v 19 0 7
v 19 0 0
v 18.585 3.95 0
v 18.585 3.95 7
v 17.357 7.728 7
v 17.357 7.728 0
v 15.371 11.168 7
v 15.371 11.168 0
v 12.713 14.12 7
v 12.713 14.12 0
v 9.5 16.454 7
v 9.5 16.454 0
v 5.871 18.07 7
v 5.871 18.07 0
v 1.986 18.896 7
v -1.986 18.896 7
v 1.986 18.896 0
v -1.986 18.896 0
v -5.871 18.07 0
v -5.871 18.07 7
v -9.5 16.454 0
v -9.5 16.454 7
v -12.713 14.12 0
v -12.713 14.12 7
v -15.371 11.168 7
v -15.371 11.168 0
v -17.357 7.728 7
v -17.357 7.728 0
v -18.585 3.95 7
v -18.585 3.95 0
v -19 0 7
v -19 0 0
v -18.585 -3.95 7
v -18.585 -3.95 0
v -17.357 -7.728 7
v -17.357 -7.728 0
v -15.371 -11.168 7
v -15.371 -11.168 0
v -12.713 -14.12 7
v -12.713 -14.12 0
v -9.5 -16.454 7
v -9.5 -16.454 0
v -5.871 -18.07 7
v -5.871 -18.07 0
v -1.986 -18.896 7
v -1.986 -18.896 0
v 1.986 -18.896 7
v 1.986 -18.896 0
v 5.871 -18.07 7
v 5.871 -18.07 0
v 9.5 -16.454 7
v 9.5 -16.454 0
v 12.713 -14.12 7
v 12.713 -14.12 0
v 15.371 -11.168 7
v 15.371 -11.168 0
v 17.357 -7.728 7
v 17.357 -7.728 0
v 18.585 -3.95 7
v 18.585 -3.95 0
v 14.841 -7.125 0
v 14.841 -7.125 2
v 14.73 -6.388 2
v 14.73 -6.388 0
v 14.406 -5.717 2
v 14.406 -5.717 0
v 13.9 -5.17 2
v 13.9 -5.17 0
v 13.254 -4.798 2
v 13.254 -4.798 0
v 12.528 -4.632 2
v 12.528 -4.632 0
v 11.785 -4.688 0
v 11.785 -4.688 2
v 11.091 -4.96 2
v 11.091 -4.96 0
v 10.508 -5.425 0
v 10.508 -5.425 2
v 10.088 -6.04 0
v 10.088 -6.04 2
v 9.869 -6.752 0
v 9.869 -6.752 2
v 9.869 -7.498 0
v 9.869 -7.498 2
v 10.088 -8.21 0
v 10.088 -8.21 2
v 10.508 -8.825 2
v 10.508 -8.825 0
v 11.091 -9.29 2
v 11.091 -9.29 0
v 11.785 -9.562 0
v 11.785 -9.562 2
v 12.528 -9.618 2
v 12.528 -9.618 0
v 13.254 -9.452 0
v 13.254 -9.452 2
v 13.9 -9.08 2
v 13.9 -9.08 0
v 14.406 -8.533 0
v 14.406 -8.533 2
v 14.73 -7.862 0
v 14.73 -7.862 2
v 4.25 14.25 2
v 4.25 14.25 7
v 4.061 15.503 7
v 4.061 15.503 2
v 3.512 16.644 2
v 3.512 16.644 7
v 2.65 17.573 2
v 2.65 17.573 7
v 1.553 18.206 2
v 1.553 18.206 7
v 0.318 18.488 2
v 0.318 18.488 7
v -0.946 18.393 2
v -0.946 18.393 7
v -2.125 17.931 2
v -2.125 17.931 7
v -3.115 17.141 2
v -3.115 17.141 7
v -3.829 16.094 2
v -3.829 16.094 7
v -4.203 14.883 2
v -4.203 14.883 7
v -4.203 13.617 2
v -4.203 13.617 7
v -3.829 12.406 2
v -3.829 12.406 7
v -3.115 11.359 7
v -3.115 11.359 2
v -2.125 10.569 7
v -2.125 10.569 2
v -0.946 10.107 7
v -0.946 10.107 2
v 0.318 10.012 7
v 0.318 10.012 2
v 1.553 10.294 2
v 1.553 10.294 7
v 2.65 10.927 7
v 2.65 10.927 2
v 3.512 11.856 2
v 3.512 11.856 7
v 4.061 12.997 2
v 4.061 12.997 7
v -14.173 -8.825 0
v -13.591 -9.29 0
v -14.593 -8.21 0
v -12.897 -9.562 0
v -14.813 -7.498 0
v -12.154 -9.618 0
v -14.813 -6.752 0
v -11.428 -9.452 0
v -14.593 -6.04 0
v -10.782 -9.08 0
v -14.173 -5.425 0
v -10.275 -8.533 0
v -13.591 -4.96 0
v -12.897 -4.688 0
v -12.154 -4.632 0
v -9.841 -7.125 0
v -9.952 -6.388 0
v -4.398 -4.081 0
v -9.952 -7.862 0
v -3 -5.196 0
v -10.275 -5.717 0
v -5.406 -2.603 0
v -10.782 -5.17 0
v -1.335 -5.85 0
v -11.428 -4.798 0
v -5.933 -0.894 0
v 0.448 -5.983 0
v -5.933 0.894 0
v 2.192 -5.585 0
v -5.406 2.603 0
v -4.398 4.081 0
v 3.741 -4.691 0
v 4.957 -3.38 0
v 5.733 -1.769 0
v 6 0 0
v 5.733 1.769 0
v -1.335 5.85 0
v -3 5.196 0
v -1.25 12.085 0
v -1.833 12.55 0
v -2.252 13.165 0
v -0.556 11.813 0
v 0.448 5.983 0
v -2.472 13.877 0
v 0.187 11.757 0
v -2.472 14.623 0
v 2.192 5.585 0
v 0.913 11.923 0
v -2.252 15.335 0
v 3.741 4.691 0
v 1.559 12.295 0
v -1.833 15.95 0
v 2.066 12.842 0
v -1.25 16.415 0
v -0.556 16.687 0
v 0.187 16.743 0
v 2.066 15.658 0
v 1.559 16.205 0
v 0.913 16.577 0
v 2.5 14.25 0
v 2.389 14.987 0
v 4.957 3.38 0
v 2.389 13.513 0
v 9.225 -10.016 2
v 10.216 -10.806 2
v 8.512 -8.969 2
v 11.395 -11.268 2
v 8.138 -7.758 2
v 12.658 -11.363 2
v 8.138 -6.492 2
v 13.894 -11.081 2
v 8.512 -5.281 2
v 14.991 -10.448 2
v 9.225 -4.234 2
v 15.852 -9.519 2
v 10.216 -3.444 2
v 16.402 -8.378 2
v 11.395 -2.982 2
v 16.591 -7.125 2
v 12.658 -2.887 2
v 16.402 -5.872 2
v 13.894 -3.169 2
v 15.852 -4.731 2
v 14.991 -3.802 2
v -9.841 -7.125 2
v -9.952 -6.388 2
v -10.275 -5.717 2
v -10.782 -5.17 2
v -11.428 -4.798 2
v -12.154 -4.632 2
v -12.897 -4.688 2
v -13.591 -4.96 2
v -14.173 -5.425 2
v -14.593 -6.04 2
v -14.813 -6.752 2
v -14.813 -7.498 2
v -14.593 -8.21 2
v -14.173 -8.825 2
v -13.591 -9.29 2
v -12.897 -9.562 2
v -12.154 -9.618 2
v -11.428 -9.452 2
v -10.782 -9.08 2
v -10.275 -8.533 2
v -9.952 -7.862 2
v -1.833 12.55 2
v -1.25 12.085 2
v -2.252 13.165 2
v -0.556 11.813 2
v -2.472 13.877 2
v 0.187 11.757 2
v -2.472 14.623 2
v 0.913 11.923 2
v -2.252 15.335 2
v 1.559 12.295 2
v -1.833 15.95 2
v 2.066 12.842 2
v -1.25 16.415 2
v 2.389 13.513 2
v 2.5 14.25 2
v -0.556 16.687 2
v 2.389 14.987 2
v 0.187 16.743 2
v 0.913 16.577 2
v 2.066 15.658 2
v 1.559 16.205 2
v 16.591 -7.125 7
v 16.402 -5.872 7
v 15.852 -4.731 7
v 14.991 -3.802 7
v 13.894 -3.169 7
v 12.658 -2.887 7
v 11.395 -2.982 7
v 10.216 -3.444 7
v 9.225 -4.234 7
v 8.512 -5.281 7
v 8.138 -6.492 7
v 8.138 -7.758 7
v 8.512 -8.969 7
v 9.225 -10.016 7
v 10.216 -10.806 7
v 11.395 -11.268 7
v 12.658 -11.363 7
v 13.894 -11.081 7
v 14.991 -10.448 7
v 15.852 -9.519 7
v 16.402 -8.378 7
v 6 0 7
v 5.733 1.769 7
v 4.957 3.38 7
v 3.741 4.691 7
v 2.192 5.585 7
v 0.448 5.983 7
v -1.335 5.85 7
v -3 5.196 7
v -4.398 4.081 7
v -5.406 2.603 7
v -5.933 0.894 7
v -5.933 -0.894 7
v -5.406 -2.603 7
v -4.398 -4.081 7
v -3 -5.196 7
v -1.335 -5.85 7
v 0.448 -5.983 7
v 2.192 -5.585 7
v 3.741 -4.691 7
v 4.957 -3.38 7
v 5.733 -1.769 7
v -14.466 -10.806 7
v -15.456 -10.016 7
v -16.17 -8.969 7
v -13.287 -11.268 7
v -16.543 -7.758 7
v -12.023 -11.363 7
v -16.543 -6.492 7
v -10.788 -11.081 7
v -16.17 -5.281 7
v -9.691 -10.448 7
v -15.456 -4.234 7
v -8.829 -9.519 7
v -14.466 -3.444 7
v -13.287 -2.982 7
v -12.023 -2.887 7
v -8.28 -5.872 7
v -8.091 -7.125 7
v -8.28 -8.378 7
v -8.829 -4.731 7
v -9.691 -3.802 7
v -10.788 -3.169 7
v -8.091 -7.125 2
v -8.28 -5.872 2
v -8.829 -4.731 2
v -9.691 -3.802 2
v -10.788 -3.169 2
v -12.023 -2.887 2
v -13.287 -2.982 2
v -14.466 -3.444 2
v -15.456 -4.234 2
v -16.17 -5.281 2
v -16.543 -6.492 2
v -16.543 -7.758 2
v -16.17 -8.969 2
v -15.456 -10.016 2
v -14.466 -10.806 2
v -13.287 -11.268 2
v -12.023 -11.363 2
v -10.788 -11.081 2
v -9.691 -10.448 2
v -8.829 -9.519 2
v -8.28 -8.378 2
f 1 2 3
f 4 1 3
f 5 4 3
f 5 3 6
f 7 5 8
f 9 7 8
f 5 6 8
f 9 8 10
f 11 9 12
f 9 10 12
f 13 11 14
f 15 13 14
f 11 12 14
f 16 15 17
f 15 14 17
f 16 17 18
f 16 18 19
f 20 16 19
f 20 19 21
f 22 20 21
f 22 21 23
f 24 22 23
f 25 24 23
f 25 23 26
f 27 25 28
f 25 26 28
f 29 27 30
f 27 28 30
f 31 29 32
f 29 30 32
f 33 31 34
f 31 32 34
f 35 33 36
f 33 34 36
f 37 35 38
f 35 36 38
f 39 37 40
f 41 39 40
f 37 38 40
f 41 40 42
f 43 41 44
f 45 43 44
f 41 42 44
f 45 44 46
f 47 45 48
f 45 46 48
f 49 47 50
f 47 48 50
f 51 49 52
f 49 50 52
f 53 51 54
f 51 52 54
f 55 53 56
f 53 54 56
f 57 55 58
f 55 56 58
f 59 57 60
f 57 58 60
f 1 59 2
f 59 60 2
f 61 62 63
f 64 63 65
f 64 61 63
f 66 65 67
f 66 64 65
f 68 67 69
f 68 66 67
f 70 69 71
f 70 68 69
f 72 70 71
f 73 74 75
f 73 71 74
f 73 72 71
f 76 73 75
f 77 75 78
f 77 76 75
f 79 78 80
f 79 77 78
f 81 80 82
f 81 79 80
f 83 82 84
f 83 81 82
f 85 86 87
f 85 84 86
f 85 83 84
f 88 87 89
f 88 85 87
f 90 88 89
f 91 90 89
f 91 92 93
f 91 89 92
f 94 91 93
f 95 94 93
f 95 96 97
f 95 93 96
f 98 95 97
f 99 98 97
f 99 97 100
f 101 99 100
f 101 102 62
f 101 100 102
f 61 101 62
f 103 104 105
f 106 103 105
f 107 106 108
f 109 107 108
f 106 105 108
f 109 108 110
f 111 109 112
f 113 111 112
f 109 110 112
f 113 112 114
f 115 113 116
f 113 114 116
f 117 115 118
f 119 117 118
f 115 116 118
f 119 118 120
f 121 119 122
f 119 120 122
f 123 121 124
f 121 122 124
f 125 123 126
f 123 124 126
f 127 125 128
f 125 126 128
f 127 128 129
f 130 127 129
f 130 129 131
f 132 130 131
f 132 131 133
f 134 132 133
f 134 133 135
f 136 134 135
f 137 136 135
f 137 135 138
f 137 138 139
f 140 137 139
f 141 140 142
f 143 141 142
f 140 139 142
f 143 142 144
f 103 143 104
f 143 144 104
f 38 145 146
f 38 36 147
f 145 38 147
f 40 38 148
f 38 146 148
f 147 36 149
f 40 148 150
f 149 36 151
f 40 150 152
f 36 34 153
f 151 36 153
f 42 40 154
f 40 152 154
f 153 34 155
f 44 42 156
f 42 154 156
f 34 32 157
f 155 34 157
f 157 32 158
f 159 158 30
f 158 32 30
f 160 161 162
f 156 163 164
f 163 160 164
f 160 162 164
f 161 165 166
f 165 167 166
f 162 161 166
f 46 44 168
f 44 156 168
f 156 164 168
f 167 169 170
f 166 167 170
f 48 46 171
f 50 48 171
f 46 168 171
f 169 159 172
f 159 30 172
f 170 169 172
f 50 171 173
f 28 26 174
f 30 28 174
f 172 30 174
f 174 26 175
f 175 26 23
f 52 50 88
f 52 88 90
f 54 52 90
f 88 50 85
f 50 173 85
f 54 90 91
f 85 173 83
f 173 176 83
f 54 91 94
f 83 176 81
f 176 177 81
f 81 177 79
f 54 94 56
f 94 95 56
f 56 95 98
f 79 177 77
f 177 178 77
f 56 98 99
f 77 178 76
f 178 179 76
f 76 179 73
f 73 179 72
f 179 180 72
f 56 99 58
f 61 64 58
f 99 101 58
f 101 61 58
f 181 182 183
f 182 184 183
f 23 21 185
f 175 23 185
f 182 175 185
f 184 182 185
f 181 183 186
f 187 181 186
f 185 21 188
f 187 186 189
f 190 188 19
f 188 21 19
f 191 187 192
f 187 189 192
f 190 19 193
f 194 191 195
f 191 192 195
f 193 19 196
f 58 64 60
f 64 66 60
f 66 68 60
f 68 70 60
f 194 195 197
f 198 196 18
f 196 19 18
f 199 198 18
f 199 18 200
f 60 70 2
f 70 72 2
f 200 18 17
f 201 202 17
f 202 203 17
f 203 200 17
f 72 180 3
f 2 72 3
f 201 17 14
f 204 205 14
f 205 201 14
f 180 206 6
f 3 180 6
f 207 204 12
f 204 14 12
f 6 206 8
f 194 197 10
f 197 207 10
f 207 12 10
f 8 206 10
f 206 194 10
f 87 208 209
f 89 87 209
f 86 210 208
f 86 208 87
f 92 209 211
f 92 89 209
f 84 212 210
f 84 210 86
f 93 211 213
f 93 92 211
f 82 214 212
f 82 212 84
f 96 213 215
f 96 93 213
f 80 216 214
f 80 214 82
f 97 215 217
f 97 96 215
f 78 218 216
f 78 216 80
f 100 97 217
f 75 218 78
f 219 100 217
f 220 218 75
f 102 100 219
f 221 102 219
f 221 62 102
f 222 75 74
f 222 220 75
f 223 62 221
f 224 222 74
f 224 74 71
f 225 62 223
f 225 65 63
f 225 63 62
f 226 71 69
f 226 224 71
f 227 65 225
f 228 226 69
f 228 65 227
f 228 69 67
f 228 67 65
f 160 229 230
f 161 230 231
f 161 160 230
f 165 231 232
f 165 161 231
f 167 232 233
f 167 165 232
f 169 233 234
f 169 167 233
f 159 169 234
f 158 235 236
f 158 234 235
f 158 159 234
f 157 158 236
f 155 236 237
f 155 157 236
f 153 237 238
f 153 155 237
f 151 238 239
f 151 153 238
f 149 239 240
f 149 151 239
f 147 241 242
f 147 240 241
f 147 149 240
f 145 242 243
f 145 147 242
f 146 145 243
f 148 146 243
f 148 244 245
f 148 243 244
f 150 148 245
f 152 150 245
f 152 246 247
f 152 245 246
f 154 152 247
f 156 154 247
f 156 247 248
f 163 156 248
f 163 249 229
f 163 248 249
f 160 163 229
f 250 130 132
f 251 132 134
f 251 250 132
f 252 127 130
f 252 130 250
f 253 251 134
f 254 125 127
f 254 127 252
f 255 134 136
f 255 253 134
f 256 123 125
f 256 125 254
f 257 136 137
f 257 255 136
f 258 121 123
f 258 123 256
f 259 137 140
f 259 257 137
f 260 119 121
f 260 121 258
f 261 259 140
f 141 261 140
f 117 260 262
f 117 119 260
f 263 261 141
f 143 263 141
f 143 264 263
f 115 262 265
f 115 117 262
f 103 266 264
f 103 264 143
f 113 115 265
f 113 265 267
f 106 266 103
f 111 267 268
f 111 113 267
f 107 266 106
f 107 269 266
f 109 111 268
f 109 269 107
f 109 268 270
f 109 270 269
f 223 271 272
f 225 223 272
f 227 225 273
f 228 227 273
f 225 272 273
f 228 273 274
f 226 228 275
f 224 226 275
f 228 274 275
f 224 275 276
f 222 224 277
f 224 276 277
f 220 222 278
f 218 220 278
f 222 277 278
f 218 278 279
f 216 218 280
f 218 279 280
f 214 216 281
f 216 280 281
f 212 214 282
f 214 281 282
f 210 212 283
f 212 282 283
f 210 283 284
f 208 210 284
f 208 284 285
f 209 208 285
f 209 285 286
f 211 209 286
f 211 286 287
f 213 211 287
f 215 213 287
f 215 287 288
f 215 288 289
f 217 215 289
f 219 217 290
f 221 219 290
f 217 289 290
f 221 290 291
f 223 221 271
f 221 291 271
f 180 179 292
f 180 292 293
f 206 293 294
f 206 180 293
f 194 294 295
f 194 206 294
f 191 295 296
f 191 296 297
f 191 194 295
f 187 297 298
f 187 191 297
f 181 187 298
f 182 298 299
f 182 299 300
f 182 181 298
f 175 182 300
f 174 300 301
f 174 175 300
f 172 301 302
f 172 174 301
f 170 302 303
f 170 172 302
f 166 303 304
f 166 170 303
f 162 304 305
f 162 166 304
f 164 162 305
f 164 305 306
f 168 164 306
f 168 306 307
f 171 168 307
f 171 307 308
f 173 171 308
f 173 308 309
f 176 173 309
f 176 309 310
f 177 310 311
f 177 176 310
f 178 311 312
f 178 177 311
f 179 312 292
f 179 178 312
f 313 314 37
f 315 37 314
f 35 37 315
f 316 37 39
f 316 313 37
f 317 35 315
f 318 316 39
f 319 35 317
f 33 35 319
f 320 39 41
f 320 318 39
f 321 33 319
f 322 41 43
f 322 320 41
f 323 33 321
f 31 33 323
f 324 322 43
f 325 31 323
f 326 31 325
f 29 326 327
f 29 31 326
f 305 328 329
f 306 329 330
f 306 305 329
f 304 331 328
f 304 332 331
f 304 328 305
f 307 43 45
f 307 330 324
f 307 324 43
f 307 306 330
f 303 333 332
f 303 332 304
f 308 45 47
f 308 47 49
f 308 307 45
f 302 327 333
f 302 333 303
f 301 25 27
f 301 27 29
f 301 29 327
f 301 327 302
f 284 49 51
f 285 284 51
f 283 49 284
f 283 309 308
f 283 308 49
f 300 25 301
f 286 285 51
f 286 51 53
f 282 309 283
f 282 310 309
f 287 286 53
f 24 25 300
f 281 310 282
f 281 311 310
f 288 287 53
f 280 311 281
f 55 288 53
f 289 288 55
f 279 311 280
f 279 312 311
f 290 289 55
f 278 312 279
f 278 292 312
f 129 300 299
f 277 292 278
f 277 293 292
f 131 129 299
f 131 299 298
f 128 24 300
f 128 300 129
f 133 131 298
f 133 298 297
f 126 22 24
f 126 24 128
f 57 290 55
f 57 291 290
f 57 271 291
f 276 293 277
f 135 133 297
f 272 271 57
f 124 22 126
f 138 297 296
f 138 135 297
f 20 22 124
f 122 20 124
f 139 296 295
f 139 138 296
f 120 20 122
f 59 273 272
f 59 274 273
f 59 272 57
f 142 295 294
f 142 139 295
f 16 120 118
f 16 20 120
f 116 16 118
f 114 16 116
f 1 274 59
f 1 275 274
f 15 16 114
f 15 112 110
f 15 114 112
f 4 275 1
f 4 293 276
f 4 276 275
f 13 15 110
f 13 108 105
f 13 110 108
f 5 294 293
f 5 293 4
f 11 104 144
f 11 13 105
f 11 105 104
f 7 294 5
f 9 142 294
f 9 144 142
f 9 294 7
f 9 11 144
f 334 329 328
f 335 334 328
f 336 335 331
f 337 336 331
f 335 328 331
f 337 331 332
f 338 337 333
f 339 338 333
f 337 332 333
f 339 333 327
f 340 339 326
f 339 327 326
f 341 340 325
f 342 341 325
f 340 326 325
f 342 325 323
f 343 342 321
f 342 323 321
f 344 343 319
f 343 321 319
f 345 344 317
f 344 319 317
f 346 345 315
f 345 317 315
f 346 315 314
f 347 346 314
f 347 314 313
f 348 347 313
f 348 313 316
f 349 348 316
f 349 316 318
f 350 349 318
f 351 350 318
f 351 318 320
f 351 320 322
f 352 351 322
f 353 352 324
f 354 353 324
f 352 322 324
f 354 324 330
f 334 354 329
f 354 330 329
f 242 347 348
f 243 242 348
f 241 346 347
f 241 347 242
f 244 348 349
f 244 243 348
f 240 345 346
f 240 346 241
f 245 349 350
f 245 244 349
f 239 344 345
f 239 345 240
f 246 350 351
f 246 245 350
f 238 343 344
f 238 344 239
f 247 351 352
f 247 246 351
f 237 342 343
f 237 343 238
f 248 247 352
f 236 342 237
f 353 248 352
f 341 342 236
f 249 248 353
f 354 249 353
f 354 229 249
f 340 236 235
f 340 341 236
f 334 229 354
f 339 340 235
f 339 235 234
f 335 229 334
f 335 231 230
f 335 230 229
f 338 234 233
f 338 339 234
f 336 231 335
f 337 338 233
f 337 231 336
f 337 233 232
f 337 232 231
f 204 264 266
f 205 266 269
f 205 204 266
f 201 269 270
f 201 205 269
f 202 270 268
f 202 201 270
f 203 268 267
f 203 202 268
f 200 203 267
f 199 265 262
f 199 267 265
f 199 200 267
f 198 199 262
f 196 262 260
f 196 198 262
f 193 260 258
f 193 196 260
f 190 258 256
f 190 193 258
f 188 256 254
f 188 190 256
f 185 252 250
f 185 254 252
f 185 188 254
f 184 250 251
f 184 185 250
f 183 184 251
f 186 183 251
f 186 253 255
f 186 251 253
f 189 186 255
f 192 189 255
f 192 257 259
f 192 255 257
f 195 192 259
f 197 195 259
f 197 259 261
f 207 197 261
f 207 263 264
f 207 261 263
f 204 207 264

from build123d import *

# Parameters (mm, degrees)
ESQUISSE1_R      = 19
ESQUISSE1_R_2    = 6
ESQUISSE1_R_3    = 2.5
EXTRUSION1_DEPTH = 7
ESQUISSE2_R      = 4.25
EXTRUSION2_DEPTH = 5


with BuildPart() as part:
    # Esquisse1 → Extrusion1 (new body)
    with BuildSketch(Plane.XY):
        Circle(ESQUISSE1_R)
        Circle(ESQUISSE1_R_2, mode=Mode.SUBTRACT)
        with Locations((12.340862004, -7.125)):
            Circle(ESQUISSE1_R_3, mode=Mode.SUBTRACT)
        with Locations((0, 14.25)):
            Circle(ESQUISSE1_R_3, mode=Mode.SUBTRACT)
        with Locations((-12.340862004, -7.125)):
            Circle(ESQUISSE1_R_3, mode=Mode.SUBTRACT)
    extrude(amount=EXTRUSION1_DEPTH)

    # Esquisse2 → Extrusion2 (cut)
    with BuildSketch(Plane.XY.offset(7)):
        with Locations((0, 14.25)):
            Circle(ESQUISSE2_R)
        with Locations((-12.340862004, -7.125)):
            Circle(ESQUISSE2_R)
        with Locations((12.340862004, -7.125)):
            Circle(ESQUISSE2_R)
    extrude(amount=-EXTRUSION2_DEPTH, mode=Mode.SUBTRACT)


solid = part.part
